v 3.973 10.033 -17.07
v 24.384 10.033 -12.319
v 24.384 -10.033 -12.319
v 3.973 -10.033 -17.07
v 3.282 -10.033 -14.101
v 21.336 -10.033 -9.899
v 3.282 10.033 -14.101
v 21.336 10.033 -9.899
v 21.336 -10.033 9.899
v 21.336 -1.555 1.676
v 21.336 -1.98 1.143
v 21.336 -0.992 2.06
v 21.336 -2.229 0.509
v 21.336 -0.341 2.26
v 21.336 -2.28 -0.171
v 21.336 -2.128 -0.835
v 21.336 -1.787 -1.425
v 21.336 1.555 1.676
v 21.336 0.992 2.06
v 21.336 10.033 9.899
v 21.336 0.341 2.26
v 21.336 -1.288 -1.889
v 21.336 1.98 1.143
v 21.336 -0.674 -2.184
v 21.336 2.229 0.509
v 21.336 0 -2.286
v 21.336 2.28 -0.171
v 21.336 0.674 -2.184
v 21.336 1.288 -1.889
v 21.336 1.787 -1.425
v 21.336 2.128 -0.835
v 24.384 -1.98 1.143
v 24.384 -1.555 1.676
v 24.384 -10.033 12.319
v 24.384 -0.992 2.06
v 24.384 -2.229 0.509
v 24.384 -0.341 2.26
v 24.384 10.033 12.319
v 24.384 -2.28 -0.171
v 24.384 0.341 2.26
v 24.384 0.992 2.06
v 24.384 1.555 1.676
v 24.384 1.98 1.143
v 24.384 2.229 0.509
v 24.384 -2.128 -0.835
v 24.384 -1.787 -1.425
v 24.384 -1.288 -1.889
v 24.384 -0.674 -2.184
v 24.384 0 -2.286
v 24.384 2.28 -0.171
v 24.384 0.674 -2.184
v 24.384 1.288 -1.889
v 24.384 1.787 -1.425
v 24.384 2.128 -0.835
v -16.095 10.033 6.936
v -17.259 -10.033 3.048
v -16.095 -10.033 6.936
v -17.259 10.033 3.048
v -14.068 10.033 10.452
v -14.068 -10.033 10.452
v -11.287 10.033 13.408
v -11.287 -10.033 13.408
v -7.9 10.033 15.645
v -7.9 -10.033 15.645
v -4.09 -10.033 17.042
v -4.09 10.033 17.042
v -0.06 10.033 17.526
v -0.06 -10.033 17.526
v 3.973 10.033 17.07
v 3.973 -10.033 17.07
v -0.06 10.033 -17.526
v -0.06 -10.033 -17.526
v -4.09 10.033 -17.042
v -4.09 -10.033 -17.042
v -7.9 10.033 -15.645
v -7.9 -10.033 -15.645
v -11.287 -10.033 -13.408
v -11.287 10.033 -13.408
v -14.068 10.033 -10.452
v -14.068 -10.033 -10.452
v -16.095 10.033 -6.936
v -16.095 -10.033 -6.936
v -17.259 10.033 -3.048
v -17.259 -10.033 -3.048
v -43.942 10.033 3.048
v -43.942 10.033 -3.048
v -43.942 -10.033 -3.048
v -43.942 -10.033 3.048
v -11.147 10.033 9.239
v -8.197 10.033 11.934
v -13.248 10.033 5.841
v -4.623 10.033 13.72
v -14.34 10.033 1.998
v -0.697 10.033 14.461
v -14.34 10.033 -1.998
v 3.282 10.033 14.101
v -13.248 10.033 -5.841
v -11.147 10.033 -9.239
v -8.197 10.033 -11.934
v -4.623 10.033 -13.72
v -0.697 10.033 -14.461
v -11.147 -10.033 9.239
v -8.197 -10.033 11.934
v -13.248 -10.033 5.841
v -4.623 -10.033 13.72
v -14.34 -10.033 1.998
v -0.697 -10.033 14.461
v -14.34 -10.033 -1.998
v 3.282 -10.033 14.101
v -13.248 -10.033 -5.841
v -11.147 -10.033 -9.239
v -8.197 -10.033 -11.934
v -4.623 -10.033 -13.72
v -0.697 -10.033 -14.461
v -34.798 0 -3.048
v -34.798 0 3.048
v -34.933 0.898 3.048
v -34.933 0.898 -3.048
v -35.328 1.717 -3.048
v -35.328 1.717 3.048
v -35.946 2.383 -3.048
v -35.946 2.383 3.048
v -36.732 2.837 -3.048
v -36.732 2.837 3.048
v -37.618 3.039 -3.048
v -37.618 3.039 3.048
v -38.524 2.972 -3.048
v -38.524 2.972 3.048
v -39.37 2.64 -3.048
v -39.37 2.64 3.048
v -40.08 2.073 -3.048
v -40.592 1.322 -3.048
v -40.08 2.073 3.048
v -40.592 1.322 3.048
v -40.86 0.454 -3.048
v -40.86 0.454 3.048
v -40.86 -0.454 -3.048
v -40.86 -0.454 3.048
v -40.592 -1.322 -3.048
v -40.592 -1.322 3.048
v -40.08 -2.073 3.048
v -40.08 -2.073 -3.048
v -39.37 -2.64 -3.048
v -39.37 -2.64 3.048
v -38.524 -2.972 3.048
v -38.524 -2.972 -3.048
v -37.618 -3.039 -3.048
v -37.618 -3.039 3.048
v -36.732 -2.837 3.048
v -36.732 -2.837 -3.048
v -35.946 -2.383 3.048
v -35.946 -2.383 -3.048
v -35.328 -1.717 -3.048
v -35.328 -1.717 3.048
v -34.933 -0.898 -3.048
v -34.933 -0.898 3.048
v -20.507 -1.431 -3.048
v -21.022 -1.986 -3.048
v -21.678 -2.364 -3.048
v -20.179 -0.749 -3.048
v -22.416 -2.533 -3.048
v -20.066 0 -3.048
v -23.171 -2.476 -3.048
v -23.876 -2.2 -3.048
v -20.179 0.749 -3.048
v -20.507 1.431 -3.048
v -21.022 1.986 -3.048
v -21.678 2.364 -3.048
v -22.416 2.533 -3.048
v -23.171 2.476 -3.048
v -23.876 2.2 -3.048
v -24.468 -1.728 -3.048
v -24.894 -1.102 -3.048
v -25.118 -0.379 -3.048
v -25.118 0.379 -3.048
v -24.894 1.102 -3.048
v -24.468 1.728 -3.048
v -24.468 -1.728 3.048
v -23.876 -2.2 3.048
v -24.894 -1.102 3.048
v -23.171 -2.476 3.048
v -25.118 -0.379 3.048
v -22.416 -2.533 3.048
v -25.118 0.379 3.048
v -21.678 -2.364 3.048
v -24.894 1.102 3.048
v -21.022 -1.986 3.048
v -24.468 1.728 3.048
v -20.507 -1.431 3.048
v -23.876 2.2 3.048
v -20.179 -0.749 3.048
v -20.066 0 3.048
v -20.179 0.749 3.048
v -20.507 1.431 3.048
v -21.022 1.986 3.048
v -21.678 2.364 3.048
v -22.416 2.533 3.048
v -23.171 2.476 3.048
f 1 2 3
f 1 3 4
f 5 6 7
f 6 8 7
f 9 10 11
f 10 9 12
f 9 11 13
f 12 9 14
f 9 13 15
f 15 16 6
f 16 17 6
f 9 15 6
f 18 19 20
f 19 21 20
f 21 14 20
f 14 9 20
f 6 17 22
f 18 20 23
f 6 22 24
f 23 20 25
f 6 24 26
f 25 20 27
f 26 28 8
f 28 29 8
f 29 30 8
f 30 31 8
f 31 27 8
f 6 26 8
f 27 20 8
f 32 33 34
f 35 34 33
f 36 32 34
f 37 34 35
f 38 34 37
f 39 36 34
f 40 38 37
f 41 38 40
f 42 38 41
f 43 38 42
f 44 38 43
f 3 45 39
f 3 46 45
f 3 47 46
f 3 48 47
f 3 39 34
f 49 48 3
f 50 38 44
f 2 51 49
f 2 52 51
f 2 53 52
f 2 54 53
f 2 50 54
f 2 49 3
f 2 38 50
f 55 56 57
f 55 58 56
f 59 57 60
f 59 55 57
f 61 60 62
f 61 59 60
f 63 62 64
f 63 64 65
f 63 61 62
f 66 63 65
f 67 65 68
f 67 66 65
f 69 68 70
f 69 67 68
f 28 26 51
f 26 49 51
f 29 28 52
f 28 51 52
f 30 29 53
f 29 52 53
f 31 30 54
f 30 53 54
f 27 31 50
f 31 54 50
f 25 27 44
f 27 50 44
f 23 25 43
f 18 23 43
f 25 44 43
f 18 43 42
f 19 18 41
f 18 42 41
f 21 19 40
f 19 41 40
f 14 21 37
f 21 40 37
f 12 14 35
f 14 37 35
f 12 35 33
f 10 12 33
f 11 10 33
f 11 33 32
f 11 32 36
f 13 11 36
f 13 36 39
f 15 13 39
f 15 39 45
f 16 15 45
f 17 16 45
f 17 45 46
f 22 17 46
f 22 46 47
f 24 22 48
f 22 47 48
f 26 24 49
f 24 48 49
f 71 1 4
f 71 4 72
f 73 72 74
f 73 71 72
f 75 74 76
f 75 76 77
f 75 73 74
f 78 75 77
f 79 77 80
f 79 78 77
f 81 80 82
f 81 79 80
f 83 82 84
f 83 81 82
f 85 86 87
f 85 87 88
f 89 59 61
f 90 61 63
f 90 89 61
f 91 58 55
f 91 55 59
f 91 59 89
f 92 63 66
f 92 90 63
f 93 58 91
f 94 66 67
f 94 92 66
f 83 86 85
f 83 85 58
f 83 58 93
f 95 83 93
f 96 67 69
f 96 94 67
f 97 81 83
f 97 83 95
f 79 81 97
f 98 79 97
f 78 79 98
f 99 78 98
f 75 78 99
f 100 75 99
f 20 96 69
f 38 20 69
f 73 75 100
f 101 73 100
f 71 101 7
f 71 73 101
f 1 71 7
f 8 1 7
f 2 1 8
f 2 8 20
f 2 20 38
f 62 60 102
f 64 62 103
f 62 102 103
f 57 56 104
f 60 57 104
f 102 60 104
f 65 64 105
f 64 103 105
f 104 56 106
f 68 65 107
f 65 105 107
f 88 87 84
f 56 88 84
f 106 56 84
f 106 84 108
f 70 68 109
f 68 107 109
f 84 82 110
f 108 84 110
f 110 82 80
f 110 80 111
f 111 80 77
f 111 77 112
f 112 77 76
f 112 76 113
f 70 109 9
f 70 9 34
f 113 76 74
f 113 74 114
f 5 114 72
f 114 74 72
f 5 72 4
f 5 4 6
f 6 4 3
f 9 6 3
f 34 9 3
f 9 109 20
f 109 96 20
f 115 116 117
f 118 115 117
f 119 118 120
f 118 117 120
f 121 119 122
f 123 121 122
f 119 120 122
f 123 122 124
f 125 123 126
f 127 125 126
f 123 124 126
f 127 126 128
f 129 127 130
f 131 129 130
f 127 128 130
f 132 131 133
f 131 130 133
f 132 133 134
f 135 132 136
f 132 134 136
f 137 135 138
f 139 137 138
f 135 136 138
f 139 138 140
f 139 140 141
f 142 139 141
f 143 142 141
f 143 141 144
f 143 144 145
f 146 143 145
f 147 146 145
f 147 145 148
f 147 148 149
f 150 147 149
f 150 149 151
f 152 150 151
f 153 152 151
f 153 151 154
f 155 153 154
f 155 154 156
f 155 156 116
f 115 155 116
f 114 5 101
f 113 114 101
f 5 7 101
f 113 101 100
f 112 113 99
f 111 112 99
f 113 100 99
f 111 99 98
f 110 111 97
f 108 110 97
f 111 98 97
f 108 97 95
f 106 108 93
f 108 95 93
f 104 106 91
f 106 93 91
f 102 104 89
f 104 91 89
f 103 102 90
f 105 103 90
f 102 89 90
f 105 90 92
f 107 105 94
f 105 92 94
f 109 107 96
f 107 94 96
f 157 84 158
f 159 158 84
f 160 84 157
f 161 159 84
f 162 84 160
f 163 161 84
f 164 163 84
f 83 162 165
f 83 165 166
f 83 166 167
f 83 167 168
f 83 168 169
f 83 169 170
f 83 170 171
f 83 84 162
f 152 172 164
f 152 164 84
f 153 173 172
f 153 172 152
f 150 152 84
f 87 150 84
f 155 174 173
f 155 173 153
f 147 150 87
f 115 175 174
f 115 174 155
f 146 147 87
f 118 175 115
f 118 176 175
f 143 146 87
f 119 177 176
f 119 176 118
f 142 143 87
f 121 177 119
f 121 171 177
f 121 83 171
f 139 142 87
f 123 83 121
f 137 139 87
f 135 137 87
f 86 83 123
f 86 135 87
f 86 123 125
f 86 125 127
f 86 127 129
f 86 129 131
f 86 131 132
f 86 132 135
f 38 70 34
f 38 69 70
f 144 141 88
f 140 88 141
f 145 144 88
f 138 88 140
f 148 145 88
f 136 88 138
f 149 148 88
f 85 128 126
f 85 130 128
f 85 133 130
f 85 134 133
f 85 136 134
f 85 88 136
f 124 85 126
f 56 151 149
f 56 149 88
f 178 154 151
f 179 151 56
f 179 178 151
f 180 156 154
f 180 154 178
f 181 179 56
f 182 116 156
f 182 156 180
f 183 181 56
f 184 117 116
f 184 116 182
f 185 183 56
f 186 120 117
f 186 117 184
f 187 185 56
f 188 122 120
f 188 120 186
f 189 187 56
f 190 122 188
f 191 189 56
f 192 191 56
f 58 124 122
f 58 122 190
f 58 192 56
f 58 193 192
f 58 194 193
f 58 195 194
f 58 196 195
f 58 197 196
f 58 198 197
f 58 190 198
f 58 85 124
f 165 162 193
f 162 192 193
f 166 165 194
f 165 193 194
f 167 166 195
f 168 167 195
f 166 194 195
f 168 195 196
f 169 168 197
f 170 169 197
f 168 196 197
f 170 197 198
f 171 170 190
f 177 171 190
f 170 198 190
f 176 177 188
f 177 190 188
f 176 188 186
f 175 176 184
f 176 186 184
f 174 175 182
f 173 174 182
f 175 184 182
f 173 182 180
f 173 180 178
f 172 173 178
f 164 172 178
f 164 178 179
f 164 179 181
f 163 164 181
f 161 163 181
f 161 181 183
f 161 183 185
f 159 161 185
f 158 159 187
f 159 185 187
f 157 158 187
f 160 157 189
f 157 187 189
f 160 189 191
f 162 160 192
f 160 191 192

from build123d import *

# Parameters (mm, degrees)
BOSS_EXTRUDE1_DEPTH = 10.033
SKETCH2_R           = 3.048
SKETCH2_R_2         = 2.54
CUT_EXTRUDE1_DEPTH  = 10.033
SKETCH3_R           = 2.286
CUT_EXTRUDE2_DEPTH  = 10.033


with BuildPart() as part:
    # Sketch1 → Boss-Extrude1 (new body, symmetric)
    with BuildSketch(Plane(origin=(0, 0, 0), x_dir=(1, 0, 0), z_dir=(0, 1, 0))):
        with BuildLine():
            Line((24.384, -12.319), (24.384, 12.319))
            Line((24.384, 12.319), (3.973043901, 17.069727536))
            ThreePointArc((3.973043901, 17.069727536), (-9.658201012, 14.624630908), (-17.258921519, 3.048))
            Line((-17.258921519, 3.048), (-43.942, 3.048))
            Line((-43.942, 3.048), (-43.942, -3.048))
            Line((-43.942, -3.048), (-17.258921519, -3.048))
            ThreePointArc((-17.258921519, -3.048), (-9.658201012, -14.624630908), (3.973043901, -17.069727536))
            Line((3.973043901, -17.069727536), (24.384, -12.319))
        make_face()
        with BuildLine():
            Line((21.336, -9.898960775), (21.336, 9.898960775))
            Line((21.336, 9.898960775), (3.282079744, 14.101079269))
            ThreePointArc((3.282079744, 14.101079269), (-14.478, 0), (3.282079744, -14.101079269))
            Line((3.282079744, -14.101079269), (21.336, -9.898960775))
        make_face(mode=Mode.SUBTRACT)
    extrude(amount=BOSS_EXTRUDE1_DEPTH, both=True)

    # Sketch2 → Cut-Extrude1 (cut, symmetric)
    with BuildSketch(Plane.XY.offset(3.048)):
        with Locations((-37.846, 0)):
            Circle(SKETCH2_R)
        with Locations((-22.606, 0)):
            Circle(SKETCH2_R_2)
    extrude(amount=CUT_EXTRUDE1_DEPTH, both=True, mode=Mode.SUBTRACT)

    # Sketch3 → Cut-Extrude2 (cut, symmetric)
    with BuildSketch(Plane(origin=(24.384, 0, 0), x_dir=(0, 0, -1), z_dir=(1, 0, 0))):
        Circle(SKETCH3_R)
    extrude(amount=CUT_EXTRUDE2_DEPTH, both=True, mode=Mode.SUBTRACT)


solid = part.part
